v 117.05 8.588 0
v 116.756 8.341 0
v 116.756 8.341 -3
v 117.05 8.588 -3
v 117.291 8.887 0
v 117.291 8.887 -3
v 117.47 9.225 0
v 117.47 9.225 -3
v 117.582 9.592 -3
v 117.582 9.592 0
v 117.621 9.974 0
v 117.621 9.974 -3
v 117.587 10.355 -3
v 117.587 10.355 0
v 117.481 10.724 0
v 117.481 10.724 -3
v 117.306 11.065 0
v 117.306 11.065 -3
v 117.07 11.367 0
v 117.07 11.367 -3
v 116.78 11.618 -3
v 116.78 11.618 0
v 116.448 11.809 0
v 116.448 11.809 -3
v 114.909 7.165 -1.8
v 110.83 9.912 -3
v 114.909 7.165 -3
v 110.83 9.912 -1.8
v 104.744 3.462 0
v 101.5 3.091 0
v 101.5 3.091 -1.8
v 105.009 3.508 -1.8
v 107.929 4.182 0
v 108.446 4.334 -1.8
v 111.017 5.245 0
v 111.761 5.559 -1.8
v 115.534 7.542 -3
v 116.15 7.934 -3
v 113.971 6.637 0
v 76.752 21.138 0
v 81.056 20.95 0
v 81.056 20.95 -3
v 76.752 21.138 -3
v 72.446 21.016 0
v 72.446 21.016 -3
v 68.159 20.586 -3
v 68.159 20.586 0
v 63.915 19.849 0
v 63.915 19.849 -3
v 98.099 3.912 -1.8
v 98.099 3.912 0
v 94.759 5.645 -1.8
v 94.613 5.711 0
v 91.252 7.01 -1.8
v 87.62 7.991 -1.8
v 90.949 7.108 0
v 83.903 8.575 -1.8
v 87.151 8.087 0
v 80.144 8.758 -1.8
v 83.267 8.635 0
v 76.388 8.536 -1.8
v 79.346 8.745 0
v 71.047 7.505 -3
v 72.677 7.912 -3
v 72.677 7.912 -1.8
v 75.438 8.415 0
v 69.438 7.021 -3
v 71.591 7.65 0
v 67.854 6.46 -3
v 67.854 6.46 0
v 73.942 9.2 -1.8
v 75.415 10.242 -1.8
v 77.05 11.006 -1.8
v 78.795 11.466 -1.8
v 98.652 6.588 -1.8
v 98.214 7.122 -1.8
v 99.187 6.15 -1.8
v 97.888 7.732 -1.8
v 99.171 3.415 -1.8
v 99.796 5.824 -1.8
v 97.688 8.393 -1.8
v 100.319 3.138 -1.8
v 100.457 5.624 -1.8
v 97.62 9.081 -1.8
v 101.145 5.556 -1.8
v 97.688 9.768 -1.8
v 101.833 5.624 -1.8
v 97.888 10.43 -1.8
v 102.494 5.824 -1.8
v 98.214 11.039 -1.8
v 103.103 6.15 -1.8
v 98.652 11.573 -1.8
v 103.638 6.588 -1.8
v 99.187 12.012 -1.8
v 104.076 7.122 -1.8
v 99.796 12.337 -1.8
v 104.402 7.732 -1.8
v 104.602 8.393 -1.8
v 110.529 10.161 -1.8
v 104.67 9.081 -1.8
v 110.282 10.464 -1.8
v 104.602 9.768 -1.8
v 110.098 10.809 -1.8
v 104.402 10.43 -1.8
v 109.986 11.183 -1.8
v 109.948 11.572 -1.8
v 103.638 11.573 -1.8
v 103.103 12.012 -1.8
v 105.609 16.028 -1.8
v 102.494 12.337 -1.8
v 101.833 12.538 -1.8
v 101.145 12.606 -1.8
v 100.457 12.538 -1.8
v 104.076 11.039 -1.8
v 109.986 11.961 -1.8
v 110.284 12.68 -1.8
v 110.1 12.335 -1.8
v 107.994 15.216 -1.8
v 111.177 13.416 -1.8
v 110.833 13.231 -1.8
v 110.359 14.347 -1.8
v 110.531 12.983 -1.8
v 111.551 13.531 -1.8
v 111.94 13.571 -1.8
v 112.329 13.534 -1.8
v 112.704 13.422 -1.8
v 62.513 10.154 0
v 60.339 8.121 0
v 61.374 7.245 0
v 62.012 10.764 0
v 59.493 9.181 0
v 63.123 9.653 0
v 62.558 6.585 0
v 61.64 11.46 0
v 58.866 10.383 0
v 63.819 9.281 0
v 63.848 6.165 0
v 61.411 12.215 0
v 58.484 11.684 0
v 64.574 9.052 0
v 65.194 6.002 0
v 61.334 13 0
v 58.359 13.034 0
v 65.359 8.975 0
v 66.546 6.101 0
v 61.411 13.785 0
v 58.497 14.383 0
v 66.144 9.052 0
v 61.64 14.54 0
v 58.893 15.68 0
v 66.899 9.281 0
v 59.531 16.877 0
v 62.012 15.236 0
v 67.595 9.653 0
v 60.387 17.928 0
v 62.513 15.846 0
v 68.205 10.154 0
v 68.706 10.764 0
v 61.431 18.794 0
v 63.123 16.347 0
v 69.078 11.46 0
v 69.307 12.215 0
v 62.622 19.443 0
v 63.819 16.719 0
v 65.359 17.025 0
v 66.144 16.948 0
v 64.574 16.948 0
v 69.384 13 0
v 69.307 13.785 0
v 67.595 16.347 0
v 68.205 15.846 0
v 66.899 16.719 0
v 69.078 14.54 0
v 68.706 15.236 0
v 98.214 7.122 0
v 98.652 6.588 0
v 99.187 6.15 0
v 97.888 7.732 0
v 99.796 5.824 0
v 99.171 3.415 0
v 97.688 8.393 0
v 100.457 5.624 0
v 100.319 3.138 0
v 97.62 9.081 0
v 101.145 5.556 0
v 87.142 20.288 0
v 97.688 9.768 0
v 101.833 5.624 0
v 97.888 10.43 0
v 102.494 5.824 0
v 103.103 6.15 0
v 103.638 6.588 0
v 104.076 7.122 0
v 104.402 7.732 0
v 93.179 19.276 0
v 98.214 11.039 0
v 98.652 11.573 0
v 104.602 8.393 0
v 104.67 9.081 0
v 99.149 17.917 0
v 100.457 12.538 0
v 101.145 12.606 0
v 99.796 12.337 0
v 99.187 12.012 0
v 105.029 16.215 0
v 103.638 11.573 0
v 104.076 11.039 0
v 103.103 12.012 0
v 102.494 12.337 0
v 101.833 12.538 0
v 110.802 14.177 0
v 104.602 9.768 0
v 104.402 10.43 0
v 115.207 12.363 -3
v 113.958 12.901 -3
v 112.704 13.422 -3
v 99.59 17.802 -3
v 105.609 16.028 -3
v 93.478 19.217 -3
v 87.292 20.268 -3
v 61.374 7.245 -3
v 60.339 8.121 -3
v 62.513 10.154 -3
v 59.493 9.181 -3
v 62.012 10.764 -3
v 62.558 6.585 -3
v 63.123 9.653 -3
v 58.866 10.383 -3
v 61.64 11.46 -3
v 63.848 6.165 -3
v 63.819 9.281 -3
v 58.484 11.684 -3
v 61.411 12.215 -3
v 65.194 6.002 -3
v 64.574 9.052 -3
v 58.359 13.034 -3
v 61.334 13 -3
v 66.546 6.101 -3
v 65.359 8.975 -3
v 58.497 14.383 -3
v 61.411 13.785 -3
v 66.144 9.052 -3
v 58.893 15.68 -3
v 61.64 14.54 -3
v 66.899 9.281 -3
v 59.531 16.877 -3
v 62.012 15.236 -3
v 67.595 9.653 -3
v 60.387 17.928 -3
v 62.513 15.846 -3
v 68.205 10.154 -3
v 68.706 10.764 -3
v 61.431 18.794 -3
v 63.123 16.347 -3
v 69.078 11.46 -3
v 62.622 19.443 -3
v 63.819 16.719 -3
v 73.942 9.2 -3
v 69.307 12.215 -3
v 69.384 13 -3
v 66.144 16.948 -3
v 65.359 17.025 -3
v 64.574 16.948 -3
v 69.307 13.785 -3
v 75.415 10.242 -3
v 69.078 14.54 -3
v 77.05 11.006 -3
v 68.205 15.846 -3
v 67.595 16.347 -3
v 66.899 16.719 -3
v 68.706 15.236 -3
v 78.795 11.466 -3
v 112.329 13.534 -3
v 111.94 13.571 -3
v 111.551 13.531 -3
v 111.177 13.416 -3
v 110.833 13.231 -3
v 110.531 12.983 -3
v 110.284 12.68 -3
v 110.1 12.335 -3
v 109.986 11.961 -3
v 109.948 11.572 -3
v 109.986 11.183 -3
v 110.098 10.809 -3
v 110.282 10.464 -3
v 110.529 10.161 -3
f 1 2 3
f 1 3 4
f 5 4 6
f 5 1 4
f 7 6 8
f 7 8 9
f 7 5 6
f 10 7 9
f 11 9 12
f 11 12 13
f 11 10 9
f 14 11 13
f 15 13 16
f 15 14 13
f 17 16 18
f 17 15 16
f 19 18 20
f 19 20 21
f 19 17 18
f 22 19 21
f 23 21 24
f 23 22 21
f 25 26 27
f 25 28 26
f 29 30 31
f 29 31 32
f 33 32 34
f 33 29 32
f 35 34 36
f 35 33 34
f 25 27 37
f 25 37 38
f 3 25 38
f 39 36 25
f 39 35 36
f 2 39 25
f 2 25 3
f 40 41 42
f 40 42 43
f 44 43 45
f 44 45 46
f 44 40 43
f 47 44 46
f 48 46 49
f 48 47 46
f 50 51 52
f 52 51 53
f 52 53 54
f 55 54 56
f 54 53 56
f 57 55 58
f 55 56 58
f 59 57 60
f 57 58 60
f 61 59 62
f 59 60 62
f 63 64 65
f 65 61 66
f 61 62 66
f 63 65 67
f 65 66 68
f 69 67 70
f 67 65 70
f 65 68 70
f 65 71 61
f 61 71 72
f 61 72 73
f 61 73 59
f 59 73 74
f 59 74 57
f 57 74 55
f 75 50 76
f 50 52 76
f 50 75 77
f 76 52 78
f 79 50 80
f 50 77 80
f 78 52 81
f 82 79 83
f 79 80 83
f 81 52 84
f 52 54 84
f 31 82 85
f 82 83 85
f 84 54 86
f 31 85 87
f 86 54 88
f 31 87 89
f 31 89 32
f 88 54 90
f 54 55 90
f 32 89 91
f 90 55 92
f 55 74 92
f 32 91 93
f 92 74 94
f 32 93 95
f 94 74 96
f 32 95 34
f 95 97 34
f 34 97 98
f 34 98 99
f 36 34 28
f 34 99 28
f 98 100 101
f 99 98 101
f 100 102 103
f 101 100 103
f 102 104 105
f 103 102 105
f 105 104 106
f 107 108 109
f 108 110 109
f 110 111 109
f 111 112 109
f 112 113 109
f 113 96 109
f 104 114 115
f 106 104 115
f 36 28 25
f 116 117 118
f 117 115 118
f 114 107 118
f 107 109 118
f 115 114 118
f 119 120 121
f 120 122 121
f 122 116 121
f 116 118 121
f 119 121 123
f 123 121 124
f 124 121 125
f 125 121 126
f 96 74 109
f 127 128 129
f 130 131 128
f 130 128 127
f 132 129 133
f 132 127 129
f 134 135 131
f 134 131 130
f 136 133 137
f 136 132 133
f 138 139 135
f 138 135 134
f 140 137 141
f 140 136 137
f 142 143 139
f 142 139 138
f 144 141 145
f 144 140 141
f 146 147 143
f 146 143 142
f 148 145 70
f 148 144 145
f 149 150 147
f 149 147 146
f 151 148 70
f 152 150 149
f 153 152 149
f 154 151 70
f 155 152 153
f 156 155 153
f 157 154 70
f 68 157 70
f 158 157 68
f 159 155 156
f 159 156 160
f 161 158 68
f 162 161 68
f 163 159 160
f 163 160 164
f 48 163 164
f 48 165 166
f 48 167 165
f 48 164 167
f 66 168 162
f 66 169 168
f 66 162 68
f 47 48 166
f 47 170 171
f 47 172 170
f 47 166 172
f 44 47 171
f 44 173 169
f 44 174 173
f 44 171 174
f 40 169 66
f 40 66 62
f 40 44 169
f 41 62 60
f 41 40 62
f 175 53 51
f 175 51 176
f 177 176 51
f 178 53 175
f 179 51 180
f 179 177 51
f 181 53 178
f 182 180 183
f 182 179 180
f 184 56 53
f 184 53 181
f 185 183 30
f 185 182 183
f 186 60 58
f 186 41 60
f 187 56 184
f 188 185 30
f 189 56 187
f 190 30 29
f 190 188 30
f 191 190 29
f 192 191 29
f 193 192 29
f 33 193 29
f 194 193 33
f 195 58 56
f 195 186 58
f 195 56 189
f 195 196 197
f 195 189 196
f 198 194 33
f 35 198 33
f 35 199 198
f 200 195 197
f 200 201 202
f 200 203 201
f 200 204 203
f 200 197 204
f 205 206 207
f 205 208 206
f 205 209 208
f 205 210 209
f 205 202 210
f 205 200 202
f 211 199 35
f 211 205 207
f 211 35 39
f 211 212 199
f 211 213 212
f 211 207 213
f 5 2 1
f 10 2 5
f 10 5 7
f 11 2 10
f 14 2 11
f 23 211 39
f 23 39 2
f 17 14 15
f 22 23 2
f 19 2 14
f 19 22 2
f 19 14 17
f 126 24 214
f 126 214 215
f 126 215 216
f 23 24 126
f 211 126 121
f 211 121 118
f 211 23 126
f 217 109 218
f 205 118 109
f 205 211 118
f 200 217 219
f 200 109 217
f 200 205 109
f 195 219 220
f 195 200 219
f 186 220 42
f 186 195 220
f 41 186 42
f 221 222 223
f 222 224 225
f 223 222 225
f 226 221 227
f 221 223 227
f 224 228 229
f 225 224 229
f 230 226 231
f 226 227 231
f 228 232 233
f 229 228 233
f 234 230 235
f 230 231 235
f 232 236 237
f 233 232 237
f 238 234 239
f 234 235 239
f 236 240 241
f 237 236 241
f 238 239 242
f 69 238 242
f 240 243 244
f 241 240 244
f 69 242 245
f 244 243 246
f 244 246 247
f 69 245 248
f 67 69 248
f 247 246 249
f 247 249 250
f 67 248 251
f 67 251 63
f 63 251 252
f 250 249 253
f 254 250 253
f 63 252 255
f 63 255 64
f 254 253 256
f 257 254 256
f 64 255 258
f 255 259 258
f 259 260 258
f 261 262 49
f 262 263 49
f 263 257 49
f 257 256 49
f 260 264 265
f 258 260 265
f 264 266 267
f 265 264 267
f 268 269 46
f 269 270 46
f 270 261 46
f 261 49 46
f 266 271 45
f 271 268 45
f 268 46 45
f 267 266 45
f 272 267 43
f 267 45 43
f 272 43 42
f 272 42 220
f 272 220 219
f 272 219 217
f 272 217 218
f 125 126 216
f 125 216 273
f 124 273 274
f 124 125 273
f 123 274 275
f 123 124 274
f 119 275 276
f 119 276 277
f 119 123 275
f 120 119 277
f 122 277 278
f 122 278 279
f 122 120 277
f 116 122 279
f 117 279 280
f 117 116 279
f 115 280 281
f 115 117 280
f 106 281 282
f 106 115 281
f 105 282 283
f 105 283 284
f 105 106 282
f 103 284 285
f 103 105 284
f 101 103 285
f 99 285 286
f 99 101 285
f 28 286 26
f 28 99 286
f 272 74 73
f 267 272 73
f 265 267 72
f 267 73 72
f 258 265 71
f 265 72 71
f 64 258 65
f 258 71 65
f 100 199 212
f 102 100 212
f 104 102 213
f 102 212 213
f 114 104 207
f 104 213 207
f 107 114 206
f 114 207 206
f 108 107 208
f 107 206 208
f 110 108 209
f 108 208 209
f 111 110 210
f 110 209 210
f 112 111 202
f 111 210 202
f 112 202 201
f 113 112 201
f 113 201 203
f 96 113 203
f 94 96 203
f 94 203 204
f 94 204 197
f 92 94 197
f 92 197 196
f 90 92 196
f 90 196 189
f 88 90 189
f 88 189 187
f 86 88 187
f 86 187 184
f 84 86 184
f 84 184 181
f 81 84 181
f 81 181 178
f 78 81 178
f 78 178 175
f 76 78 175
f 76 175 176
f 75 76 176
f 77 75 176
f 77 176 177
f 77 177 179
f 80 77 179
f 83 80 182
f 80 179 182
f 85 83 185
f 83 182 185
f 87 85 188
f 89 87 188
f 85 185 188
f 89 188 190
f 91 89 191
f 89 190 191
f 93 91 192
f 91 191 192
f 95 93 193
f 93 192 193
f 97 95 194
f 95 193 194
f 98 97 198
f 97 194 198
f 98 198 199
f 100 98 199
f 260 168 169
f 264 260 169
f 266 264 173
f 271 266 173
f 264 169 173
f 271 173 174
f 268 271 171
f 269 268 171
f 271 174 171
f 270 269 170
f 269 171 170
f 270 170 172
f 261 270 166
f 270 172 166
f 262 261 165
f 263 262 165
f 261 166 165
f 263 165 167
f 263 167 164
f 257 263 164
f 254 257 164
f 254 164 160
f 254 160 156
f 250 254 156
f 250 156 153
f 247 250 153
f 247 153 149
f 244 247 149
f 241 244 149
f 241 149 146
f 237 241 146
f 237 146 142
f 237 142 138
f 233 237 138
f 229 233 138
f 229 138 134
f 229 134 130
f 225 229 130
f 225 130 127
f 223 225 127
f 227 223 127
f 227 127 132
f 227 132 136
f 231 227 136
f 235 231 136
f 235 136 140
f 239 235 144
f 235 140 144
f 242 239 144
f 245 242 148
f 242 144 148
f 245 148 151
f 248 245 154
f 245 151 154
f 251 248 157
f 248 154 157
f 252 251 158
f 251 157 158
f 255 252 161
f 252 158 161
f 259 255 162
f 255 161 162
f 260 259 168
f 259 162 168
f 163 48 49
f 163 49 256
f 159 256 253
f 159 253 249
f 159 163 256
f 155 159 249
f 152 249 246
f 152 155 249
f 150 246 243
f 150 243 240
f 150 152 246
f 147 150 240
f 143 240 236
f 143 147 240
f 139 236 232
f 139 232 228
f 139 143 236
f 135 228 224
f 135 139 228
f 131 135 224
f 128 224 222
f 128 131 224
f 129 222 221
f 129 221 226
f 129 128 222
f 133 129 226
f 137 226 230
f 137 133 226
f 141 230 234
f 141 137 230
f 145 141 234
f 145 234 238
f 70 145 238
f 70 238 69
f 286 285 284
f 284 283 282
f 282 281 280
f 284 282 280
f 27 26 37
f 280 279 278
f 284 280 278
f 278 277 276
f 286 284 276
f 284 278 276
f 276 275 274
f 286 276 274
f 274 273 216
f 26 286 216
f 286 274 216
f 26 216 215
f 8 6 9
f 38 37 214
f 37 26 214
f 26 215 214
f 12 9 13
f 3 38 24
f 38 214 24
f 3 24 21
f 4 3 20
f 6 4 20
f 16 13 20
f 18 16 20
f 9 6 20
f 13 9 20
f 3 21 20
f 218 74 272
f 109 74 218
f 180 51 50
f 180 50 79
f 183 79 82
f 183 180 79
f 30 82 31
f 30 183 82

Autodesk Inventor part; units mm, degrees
ref_plane "YZ Plane" through (0, 0, 0) normal (1, 0, 0) x (0, 1, 0)
ref_plane "XZ Plane" through (0, 0, 0) normal (0, 1, 0) x (-1, 0, 0)
ref_plane "XY Plane" through (0, 0, 0) normal (0, 0, 1) x (1, 0, 0)
sketch "Sketch1" plane through (0, 0, 0) normal (0, 0, 1) x (1, 0, 0)
  line L0 (65.359, 13) -> (101.145, 9.0808) construction
  circle A0 centre (65.359, 13) radius 3 construction
  circle A1 centre (65.359, 13) radius 4.025
  circle A2 centre (65.359, 13) radius 7
  arc A3 (103.9065, 14.4076) -> (101.5853, 15.5481) centre (76.292, -38.8601) ccw construction
  arc A4 (98.0987, 3.9117) -> (67.8539, 6.4597) centre (80.3286, -26.2417) ccw
  circle A5 centre (101.145, 9.0808) radius 2.5 construction
  circle A6 centre (101.145, 9.0808) radius 3.525
  circle A7 centre (101.145, 9.0808) radius 6
  line L1 (101.145, 9.0808) -> (116.8532, -6.3223) construction
  circle A8 centre (116.8532, -6.3223) radius 10 construction
  circle A9 centre (116.8532, -6.3223) radius 7.025 construction
  line L2 (104.4969, 14.0572) -> (122.4397, 1.9718) construction
  line L3 (96.2353, 5.6319) -> (108.6703, -12.0703) construction
  line L4 (121.8748, 2.4728) -> (123.0794, 1.6615) construction
  arc A10 (101.4998, 3.0913) -> (116.7565, 8.3414) centre (99.726, 33.0388) ccw
  arc A11 (116.4477, 11.8091) -> (81.0555, 20.9505) centre (72.64, -84.7149) ccw
  arc A12 (116.7565, 8.3414) -> (116.4477, 11.8091) centre (115.6212, 9.9879) ccw
  line L5 (65.359, 13) -> (100, 0) construction
  arc A13 (112.7035, 13.4223) -> (110.8303, 9.9119) centre (111.9476, 11.5707) ccw
  line L6 (101.145, 9.0808) -> (80.4889, 1.5095) construction
  circle A14 centre (80.4889, 1.5095) radius 7.025 construction
  circle A15 centre (80.4889, 1.5095) radius 10 construction
  line L7 (110.8303, 9.9119) -> (114.9091, 7.1646)
  arc A16 (81.0555, 20.9505) -> (63.915, 19.8494) centre (76.292, -38.8601) ccw
  arc A17 (101.5853, 15.5481) -> (81.0555, 20.9505) centre (76.292, -38.8601) ccw construction
  line L8 (78.8119, 11.3678) -> (100.1388, 14.9958) construction
  line L9 (78.7951, 11.4664) -> (105.6086, 16.0277)
  arc A18 (78.7951, 11.4664) -> (72.6773, 7.9118) centre (80.4889, 1.5095) ccw
  point P0 (0, 0)
  point P1 (104.5045, 16.3824)
  dimension "d57" = 20
  dimension "d1" = 8.05
  dimension "d2" = 6
  dimension "d3" = 14
  dimension "d4" = 60
  dimension "d5" = 35
  dimension "d8" = 22
  dimension "d10" = 12
  dimension "d11" = 7.05
  dimension "d12" = 20
  dimension "d13" = 14.05
  dimension "d15" = 0.1
  dimension "d16" = 30
  dimension "d17" = 5
  dimension "d18" = 2
  dimension "d19" = 106
  dimension "d21" = 121
  dimension "d46" = 13
  dimension "d47" = 37
  dimension "d48" = 18
  dimension "d50" = 0
  dimension "d51" = 100
  dimension "d53" = 2
  dimension "d54" = 4
  dimension "d55" = 22
  dimension "d56" = 14.05
  dimension "d65" = 14.32
  dimension "d68" = 26.38
  dimension "d69" = 0.1
  dimension "d70" = 0.1
  dimension "d72" = 36
extrude "Extrusion5" add sketch "Sketch1" against normal blind 3 contours A2 | A2 A16 A11 L9 A18 A4 | A11 A12 A10 L7 A13
extrude "Extrusion6" add sketch "Sketch1" against normal blind 1.8 contours A18 L9 A11 A13 L7 A10 A7 A4 | A7
properties part number "揺動節" material "Aluminum 2014-T6"
